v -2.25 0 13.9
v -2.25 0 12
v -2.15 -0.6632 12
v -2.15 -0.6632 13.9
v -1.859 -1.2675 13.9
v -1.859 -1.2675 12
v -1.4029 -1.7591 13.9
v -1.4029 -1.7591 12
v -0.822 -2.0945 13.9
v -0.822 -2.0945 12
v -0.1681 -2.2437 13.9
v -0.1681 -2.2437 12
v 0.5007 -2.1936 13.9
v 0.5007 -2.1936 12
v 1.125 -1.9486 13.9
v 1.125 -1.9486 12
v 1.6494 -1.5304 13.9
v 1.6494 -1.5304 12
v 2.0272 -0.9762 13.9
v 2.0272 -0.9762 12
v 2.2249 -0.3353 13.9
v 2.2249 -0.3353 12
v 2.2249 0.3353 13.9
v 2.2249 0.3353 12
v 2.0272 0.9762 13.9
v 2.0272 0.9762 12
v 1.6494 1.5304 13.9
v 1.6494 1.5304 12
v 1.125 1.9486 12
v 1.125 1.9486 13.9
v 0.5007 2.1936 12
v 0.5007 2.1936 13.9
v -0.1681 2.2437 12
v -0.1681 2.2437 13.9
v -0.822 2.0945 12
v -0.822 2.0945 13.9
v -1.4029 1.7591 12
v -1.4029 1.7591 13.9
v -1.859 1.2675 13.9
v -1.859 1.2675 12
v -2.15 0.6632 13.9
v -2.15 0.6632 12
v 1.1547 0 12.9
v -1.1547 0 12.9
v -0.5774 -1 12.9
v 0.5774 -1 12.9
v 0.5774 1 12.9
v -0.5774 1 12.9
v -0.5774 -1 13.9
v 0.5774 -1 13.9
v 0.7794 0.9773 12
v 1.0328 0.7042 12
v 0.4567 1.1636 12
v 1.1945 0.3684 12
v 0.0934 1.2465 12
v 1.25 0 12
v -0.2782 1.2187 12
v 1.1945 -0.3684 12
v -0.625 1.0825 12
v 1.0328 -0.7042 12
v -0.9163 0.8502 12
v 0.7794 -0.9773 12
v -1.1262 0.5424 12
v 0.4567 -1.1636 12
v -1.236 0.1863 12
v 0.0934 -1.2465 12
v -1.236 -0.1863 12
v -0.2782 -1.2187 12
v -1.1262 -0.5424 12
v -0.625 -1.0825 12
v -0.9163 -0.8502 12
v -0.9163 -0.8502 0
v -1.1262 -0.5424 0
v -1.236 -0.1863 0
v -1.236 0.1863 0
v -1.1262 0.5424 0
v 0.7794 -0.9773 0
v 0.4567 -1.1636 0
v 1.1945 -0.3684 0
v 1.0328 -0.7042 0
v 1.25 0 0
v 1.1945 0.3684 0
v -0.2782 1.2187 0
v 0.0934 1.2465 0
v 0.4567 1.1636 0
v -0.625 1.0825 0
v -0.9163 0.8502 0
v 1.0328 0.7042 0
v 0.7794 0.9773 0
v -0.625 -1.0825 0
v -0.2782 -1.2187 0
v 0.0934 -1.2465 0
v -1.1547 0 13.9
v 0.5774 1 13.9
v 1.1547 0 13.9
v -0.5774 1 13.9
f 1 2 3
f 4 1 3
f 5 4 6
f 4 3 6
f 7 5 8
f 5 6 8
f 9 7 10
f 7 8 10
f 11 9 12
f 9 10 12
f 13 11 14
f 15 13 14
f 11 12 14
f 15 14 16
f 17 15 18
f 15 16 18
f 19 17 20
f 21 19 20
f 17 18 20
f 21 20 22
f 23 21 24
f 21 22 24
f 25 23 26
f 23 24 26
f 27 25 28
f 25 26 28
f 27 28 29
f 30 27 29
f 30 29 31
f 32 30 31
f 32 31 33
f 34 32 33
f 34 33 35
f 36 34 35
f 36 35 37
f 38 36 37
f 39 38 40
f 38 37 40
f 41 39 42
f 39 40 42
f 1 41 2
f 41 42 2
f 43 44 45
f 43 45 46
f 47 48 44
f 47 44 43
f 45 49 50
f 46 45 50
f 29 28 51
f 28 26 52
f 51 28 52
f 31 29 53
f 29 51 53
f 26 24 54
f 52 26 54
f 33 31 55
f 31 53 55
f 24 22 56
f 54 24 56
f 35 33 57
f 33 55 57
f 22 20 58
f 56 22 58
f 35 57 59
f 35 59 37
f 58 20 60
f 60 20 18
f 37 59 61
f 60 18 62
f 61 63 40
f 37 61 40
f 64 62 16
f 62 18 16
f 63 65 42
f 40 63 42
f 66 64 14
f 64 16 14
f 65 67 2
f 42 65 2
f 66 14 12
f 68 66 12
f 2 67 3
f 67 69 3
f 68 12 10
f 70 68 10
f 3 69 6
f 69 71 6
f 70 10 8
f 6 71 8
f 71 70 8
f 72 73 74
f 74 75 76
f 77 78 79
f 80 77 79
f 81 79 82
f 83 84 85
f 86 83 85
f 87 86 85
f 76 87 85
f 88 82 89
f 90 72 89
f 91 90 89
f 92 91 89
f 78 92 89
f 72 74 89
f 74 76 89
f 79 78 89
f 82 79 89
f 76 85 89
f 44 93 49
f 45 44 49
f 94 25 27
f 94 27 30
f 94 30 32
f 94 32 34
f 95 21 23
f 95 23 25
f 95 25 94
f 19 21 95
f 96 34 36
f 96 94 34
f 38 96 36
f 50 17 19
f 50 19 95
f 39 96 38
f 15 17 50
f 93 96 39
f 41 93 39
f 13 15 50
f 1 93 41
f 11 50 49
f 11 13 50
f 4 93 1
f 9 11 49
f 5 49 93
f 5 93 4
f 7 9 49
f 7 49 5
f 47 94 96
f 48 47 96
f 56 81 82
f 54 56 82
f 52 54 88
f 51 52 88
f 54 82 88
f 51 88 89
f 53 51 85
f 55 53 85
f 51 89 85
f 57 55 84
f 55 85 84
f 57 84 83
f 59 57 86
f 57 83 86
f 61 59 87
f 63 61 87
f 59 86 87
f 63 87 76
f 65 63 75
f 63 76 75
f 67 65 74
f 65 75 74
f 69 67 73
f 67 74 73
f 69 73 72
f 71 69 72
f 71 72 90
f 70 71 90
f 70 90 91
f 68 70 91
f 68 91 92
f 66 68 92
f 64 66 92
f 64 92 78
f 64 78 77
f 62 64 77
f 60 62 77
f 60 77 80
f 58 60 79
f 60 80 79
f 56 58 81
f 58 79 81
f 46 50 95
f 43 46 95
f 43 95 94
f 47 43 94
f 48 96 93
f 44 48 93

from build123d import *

# Parameters (mm, degrees)
ESQUISSE1_R             = 1.25
BOSS_EXTRU_1_DEPTH      = 12
ESQUISSE2_R             = 2.25
BOSS_EXTRU_2_DEPTH      = 1.9
ENL_V_MAT_EXTRU_1_DEPTH = 1


with BuildPart() as part:
    # Esquisse1 → Boss.-Extru.1 (new body)
    with BuildSketch(Plane.XY):
        Circle(ESQUISSE1_R)
    extrude(amount=BOSS_EXTRU_1_DEPTH)

    # Esquisse2 → Boss.-Extru.2 (add)
    with BuildSketch(Plane.XY.offset(12)):
        with Locations(Location((0, 0, 0), (0, 0, 180))):
            Circle(ESQUISSE2_R)
    extrude(amount=BOSS_EXTRU_2_DEPTH)

    # Esquisse3 → Enlèv. mat.-Extru.1 (cut)
    with BuildSketch(Plane.XY.offset(13.9)):
        Polygon((1.154700538, 0), (0.577350269, 1), (-0.577350269, 1), (-1.154700538, 0), (-0.577350269, -1), (0.577350269, -1), align=None)
    extrude(amount=-ENL_V_MAT_EXTRU_1_DEPTH, mode=Mode.SUBTRACT)


solid = part.part
